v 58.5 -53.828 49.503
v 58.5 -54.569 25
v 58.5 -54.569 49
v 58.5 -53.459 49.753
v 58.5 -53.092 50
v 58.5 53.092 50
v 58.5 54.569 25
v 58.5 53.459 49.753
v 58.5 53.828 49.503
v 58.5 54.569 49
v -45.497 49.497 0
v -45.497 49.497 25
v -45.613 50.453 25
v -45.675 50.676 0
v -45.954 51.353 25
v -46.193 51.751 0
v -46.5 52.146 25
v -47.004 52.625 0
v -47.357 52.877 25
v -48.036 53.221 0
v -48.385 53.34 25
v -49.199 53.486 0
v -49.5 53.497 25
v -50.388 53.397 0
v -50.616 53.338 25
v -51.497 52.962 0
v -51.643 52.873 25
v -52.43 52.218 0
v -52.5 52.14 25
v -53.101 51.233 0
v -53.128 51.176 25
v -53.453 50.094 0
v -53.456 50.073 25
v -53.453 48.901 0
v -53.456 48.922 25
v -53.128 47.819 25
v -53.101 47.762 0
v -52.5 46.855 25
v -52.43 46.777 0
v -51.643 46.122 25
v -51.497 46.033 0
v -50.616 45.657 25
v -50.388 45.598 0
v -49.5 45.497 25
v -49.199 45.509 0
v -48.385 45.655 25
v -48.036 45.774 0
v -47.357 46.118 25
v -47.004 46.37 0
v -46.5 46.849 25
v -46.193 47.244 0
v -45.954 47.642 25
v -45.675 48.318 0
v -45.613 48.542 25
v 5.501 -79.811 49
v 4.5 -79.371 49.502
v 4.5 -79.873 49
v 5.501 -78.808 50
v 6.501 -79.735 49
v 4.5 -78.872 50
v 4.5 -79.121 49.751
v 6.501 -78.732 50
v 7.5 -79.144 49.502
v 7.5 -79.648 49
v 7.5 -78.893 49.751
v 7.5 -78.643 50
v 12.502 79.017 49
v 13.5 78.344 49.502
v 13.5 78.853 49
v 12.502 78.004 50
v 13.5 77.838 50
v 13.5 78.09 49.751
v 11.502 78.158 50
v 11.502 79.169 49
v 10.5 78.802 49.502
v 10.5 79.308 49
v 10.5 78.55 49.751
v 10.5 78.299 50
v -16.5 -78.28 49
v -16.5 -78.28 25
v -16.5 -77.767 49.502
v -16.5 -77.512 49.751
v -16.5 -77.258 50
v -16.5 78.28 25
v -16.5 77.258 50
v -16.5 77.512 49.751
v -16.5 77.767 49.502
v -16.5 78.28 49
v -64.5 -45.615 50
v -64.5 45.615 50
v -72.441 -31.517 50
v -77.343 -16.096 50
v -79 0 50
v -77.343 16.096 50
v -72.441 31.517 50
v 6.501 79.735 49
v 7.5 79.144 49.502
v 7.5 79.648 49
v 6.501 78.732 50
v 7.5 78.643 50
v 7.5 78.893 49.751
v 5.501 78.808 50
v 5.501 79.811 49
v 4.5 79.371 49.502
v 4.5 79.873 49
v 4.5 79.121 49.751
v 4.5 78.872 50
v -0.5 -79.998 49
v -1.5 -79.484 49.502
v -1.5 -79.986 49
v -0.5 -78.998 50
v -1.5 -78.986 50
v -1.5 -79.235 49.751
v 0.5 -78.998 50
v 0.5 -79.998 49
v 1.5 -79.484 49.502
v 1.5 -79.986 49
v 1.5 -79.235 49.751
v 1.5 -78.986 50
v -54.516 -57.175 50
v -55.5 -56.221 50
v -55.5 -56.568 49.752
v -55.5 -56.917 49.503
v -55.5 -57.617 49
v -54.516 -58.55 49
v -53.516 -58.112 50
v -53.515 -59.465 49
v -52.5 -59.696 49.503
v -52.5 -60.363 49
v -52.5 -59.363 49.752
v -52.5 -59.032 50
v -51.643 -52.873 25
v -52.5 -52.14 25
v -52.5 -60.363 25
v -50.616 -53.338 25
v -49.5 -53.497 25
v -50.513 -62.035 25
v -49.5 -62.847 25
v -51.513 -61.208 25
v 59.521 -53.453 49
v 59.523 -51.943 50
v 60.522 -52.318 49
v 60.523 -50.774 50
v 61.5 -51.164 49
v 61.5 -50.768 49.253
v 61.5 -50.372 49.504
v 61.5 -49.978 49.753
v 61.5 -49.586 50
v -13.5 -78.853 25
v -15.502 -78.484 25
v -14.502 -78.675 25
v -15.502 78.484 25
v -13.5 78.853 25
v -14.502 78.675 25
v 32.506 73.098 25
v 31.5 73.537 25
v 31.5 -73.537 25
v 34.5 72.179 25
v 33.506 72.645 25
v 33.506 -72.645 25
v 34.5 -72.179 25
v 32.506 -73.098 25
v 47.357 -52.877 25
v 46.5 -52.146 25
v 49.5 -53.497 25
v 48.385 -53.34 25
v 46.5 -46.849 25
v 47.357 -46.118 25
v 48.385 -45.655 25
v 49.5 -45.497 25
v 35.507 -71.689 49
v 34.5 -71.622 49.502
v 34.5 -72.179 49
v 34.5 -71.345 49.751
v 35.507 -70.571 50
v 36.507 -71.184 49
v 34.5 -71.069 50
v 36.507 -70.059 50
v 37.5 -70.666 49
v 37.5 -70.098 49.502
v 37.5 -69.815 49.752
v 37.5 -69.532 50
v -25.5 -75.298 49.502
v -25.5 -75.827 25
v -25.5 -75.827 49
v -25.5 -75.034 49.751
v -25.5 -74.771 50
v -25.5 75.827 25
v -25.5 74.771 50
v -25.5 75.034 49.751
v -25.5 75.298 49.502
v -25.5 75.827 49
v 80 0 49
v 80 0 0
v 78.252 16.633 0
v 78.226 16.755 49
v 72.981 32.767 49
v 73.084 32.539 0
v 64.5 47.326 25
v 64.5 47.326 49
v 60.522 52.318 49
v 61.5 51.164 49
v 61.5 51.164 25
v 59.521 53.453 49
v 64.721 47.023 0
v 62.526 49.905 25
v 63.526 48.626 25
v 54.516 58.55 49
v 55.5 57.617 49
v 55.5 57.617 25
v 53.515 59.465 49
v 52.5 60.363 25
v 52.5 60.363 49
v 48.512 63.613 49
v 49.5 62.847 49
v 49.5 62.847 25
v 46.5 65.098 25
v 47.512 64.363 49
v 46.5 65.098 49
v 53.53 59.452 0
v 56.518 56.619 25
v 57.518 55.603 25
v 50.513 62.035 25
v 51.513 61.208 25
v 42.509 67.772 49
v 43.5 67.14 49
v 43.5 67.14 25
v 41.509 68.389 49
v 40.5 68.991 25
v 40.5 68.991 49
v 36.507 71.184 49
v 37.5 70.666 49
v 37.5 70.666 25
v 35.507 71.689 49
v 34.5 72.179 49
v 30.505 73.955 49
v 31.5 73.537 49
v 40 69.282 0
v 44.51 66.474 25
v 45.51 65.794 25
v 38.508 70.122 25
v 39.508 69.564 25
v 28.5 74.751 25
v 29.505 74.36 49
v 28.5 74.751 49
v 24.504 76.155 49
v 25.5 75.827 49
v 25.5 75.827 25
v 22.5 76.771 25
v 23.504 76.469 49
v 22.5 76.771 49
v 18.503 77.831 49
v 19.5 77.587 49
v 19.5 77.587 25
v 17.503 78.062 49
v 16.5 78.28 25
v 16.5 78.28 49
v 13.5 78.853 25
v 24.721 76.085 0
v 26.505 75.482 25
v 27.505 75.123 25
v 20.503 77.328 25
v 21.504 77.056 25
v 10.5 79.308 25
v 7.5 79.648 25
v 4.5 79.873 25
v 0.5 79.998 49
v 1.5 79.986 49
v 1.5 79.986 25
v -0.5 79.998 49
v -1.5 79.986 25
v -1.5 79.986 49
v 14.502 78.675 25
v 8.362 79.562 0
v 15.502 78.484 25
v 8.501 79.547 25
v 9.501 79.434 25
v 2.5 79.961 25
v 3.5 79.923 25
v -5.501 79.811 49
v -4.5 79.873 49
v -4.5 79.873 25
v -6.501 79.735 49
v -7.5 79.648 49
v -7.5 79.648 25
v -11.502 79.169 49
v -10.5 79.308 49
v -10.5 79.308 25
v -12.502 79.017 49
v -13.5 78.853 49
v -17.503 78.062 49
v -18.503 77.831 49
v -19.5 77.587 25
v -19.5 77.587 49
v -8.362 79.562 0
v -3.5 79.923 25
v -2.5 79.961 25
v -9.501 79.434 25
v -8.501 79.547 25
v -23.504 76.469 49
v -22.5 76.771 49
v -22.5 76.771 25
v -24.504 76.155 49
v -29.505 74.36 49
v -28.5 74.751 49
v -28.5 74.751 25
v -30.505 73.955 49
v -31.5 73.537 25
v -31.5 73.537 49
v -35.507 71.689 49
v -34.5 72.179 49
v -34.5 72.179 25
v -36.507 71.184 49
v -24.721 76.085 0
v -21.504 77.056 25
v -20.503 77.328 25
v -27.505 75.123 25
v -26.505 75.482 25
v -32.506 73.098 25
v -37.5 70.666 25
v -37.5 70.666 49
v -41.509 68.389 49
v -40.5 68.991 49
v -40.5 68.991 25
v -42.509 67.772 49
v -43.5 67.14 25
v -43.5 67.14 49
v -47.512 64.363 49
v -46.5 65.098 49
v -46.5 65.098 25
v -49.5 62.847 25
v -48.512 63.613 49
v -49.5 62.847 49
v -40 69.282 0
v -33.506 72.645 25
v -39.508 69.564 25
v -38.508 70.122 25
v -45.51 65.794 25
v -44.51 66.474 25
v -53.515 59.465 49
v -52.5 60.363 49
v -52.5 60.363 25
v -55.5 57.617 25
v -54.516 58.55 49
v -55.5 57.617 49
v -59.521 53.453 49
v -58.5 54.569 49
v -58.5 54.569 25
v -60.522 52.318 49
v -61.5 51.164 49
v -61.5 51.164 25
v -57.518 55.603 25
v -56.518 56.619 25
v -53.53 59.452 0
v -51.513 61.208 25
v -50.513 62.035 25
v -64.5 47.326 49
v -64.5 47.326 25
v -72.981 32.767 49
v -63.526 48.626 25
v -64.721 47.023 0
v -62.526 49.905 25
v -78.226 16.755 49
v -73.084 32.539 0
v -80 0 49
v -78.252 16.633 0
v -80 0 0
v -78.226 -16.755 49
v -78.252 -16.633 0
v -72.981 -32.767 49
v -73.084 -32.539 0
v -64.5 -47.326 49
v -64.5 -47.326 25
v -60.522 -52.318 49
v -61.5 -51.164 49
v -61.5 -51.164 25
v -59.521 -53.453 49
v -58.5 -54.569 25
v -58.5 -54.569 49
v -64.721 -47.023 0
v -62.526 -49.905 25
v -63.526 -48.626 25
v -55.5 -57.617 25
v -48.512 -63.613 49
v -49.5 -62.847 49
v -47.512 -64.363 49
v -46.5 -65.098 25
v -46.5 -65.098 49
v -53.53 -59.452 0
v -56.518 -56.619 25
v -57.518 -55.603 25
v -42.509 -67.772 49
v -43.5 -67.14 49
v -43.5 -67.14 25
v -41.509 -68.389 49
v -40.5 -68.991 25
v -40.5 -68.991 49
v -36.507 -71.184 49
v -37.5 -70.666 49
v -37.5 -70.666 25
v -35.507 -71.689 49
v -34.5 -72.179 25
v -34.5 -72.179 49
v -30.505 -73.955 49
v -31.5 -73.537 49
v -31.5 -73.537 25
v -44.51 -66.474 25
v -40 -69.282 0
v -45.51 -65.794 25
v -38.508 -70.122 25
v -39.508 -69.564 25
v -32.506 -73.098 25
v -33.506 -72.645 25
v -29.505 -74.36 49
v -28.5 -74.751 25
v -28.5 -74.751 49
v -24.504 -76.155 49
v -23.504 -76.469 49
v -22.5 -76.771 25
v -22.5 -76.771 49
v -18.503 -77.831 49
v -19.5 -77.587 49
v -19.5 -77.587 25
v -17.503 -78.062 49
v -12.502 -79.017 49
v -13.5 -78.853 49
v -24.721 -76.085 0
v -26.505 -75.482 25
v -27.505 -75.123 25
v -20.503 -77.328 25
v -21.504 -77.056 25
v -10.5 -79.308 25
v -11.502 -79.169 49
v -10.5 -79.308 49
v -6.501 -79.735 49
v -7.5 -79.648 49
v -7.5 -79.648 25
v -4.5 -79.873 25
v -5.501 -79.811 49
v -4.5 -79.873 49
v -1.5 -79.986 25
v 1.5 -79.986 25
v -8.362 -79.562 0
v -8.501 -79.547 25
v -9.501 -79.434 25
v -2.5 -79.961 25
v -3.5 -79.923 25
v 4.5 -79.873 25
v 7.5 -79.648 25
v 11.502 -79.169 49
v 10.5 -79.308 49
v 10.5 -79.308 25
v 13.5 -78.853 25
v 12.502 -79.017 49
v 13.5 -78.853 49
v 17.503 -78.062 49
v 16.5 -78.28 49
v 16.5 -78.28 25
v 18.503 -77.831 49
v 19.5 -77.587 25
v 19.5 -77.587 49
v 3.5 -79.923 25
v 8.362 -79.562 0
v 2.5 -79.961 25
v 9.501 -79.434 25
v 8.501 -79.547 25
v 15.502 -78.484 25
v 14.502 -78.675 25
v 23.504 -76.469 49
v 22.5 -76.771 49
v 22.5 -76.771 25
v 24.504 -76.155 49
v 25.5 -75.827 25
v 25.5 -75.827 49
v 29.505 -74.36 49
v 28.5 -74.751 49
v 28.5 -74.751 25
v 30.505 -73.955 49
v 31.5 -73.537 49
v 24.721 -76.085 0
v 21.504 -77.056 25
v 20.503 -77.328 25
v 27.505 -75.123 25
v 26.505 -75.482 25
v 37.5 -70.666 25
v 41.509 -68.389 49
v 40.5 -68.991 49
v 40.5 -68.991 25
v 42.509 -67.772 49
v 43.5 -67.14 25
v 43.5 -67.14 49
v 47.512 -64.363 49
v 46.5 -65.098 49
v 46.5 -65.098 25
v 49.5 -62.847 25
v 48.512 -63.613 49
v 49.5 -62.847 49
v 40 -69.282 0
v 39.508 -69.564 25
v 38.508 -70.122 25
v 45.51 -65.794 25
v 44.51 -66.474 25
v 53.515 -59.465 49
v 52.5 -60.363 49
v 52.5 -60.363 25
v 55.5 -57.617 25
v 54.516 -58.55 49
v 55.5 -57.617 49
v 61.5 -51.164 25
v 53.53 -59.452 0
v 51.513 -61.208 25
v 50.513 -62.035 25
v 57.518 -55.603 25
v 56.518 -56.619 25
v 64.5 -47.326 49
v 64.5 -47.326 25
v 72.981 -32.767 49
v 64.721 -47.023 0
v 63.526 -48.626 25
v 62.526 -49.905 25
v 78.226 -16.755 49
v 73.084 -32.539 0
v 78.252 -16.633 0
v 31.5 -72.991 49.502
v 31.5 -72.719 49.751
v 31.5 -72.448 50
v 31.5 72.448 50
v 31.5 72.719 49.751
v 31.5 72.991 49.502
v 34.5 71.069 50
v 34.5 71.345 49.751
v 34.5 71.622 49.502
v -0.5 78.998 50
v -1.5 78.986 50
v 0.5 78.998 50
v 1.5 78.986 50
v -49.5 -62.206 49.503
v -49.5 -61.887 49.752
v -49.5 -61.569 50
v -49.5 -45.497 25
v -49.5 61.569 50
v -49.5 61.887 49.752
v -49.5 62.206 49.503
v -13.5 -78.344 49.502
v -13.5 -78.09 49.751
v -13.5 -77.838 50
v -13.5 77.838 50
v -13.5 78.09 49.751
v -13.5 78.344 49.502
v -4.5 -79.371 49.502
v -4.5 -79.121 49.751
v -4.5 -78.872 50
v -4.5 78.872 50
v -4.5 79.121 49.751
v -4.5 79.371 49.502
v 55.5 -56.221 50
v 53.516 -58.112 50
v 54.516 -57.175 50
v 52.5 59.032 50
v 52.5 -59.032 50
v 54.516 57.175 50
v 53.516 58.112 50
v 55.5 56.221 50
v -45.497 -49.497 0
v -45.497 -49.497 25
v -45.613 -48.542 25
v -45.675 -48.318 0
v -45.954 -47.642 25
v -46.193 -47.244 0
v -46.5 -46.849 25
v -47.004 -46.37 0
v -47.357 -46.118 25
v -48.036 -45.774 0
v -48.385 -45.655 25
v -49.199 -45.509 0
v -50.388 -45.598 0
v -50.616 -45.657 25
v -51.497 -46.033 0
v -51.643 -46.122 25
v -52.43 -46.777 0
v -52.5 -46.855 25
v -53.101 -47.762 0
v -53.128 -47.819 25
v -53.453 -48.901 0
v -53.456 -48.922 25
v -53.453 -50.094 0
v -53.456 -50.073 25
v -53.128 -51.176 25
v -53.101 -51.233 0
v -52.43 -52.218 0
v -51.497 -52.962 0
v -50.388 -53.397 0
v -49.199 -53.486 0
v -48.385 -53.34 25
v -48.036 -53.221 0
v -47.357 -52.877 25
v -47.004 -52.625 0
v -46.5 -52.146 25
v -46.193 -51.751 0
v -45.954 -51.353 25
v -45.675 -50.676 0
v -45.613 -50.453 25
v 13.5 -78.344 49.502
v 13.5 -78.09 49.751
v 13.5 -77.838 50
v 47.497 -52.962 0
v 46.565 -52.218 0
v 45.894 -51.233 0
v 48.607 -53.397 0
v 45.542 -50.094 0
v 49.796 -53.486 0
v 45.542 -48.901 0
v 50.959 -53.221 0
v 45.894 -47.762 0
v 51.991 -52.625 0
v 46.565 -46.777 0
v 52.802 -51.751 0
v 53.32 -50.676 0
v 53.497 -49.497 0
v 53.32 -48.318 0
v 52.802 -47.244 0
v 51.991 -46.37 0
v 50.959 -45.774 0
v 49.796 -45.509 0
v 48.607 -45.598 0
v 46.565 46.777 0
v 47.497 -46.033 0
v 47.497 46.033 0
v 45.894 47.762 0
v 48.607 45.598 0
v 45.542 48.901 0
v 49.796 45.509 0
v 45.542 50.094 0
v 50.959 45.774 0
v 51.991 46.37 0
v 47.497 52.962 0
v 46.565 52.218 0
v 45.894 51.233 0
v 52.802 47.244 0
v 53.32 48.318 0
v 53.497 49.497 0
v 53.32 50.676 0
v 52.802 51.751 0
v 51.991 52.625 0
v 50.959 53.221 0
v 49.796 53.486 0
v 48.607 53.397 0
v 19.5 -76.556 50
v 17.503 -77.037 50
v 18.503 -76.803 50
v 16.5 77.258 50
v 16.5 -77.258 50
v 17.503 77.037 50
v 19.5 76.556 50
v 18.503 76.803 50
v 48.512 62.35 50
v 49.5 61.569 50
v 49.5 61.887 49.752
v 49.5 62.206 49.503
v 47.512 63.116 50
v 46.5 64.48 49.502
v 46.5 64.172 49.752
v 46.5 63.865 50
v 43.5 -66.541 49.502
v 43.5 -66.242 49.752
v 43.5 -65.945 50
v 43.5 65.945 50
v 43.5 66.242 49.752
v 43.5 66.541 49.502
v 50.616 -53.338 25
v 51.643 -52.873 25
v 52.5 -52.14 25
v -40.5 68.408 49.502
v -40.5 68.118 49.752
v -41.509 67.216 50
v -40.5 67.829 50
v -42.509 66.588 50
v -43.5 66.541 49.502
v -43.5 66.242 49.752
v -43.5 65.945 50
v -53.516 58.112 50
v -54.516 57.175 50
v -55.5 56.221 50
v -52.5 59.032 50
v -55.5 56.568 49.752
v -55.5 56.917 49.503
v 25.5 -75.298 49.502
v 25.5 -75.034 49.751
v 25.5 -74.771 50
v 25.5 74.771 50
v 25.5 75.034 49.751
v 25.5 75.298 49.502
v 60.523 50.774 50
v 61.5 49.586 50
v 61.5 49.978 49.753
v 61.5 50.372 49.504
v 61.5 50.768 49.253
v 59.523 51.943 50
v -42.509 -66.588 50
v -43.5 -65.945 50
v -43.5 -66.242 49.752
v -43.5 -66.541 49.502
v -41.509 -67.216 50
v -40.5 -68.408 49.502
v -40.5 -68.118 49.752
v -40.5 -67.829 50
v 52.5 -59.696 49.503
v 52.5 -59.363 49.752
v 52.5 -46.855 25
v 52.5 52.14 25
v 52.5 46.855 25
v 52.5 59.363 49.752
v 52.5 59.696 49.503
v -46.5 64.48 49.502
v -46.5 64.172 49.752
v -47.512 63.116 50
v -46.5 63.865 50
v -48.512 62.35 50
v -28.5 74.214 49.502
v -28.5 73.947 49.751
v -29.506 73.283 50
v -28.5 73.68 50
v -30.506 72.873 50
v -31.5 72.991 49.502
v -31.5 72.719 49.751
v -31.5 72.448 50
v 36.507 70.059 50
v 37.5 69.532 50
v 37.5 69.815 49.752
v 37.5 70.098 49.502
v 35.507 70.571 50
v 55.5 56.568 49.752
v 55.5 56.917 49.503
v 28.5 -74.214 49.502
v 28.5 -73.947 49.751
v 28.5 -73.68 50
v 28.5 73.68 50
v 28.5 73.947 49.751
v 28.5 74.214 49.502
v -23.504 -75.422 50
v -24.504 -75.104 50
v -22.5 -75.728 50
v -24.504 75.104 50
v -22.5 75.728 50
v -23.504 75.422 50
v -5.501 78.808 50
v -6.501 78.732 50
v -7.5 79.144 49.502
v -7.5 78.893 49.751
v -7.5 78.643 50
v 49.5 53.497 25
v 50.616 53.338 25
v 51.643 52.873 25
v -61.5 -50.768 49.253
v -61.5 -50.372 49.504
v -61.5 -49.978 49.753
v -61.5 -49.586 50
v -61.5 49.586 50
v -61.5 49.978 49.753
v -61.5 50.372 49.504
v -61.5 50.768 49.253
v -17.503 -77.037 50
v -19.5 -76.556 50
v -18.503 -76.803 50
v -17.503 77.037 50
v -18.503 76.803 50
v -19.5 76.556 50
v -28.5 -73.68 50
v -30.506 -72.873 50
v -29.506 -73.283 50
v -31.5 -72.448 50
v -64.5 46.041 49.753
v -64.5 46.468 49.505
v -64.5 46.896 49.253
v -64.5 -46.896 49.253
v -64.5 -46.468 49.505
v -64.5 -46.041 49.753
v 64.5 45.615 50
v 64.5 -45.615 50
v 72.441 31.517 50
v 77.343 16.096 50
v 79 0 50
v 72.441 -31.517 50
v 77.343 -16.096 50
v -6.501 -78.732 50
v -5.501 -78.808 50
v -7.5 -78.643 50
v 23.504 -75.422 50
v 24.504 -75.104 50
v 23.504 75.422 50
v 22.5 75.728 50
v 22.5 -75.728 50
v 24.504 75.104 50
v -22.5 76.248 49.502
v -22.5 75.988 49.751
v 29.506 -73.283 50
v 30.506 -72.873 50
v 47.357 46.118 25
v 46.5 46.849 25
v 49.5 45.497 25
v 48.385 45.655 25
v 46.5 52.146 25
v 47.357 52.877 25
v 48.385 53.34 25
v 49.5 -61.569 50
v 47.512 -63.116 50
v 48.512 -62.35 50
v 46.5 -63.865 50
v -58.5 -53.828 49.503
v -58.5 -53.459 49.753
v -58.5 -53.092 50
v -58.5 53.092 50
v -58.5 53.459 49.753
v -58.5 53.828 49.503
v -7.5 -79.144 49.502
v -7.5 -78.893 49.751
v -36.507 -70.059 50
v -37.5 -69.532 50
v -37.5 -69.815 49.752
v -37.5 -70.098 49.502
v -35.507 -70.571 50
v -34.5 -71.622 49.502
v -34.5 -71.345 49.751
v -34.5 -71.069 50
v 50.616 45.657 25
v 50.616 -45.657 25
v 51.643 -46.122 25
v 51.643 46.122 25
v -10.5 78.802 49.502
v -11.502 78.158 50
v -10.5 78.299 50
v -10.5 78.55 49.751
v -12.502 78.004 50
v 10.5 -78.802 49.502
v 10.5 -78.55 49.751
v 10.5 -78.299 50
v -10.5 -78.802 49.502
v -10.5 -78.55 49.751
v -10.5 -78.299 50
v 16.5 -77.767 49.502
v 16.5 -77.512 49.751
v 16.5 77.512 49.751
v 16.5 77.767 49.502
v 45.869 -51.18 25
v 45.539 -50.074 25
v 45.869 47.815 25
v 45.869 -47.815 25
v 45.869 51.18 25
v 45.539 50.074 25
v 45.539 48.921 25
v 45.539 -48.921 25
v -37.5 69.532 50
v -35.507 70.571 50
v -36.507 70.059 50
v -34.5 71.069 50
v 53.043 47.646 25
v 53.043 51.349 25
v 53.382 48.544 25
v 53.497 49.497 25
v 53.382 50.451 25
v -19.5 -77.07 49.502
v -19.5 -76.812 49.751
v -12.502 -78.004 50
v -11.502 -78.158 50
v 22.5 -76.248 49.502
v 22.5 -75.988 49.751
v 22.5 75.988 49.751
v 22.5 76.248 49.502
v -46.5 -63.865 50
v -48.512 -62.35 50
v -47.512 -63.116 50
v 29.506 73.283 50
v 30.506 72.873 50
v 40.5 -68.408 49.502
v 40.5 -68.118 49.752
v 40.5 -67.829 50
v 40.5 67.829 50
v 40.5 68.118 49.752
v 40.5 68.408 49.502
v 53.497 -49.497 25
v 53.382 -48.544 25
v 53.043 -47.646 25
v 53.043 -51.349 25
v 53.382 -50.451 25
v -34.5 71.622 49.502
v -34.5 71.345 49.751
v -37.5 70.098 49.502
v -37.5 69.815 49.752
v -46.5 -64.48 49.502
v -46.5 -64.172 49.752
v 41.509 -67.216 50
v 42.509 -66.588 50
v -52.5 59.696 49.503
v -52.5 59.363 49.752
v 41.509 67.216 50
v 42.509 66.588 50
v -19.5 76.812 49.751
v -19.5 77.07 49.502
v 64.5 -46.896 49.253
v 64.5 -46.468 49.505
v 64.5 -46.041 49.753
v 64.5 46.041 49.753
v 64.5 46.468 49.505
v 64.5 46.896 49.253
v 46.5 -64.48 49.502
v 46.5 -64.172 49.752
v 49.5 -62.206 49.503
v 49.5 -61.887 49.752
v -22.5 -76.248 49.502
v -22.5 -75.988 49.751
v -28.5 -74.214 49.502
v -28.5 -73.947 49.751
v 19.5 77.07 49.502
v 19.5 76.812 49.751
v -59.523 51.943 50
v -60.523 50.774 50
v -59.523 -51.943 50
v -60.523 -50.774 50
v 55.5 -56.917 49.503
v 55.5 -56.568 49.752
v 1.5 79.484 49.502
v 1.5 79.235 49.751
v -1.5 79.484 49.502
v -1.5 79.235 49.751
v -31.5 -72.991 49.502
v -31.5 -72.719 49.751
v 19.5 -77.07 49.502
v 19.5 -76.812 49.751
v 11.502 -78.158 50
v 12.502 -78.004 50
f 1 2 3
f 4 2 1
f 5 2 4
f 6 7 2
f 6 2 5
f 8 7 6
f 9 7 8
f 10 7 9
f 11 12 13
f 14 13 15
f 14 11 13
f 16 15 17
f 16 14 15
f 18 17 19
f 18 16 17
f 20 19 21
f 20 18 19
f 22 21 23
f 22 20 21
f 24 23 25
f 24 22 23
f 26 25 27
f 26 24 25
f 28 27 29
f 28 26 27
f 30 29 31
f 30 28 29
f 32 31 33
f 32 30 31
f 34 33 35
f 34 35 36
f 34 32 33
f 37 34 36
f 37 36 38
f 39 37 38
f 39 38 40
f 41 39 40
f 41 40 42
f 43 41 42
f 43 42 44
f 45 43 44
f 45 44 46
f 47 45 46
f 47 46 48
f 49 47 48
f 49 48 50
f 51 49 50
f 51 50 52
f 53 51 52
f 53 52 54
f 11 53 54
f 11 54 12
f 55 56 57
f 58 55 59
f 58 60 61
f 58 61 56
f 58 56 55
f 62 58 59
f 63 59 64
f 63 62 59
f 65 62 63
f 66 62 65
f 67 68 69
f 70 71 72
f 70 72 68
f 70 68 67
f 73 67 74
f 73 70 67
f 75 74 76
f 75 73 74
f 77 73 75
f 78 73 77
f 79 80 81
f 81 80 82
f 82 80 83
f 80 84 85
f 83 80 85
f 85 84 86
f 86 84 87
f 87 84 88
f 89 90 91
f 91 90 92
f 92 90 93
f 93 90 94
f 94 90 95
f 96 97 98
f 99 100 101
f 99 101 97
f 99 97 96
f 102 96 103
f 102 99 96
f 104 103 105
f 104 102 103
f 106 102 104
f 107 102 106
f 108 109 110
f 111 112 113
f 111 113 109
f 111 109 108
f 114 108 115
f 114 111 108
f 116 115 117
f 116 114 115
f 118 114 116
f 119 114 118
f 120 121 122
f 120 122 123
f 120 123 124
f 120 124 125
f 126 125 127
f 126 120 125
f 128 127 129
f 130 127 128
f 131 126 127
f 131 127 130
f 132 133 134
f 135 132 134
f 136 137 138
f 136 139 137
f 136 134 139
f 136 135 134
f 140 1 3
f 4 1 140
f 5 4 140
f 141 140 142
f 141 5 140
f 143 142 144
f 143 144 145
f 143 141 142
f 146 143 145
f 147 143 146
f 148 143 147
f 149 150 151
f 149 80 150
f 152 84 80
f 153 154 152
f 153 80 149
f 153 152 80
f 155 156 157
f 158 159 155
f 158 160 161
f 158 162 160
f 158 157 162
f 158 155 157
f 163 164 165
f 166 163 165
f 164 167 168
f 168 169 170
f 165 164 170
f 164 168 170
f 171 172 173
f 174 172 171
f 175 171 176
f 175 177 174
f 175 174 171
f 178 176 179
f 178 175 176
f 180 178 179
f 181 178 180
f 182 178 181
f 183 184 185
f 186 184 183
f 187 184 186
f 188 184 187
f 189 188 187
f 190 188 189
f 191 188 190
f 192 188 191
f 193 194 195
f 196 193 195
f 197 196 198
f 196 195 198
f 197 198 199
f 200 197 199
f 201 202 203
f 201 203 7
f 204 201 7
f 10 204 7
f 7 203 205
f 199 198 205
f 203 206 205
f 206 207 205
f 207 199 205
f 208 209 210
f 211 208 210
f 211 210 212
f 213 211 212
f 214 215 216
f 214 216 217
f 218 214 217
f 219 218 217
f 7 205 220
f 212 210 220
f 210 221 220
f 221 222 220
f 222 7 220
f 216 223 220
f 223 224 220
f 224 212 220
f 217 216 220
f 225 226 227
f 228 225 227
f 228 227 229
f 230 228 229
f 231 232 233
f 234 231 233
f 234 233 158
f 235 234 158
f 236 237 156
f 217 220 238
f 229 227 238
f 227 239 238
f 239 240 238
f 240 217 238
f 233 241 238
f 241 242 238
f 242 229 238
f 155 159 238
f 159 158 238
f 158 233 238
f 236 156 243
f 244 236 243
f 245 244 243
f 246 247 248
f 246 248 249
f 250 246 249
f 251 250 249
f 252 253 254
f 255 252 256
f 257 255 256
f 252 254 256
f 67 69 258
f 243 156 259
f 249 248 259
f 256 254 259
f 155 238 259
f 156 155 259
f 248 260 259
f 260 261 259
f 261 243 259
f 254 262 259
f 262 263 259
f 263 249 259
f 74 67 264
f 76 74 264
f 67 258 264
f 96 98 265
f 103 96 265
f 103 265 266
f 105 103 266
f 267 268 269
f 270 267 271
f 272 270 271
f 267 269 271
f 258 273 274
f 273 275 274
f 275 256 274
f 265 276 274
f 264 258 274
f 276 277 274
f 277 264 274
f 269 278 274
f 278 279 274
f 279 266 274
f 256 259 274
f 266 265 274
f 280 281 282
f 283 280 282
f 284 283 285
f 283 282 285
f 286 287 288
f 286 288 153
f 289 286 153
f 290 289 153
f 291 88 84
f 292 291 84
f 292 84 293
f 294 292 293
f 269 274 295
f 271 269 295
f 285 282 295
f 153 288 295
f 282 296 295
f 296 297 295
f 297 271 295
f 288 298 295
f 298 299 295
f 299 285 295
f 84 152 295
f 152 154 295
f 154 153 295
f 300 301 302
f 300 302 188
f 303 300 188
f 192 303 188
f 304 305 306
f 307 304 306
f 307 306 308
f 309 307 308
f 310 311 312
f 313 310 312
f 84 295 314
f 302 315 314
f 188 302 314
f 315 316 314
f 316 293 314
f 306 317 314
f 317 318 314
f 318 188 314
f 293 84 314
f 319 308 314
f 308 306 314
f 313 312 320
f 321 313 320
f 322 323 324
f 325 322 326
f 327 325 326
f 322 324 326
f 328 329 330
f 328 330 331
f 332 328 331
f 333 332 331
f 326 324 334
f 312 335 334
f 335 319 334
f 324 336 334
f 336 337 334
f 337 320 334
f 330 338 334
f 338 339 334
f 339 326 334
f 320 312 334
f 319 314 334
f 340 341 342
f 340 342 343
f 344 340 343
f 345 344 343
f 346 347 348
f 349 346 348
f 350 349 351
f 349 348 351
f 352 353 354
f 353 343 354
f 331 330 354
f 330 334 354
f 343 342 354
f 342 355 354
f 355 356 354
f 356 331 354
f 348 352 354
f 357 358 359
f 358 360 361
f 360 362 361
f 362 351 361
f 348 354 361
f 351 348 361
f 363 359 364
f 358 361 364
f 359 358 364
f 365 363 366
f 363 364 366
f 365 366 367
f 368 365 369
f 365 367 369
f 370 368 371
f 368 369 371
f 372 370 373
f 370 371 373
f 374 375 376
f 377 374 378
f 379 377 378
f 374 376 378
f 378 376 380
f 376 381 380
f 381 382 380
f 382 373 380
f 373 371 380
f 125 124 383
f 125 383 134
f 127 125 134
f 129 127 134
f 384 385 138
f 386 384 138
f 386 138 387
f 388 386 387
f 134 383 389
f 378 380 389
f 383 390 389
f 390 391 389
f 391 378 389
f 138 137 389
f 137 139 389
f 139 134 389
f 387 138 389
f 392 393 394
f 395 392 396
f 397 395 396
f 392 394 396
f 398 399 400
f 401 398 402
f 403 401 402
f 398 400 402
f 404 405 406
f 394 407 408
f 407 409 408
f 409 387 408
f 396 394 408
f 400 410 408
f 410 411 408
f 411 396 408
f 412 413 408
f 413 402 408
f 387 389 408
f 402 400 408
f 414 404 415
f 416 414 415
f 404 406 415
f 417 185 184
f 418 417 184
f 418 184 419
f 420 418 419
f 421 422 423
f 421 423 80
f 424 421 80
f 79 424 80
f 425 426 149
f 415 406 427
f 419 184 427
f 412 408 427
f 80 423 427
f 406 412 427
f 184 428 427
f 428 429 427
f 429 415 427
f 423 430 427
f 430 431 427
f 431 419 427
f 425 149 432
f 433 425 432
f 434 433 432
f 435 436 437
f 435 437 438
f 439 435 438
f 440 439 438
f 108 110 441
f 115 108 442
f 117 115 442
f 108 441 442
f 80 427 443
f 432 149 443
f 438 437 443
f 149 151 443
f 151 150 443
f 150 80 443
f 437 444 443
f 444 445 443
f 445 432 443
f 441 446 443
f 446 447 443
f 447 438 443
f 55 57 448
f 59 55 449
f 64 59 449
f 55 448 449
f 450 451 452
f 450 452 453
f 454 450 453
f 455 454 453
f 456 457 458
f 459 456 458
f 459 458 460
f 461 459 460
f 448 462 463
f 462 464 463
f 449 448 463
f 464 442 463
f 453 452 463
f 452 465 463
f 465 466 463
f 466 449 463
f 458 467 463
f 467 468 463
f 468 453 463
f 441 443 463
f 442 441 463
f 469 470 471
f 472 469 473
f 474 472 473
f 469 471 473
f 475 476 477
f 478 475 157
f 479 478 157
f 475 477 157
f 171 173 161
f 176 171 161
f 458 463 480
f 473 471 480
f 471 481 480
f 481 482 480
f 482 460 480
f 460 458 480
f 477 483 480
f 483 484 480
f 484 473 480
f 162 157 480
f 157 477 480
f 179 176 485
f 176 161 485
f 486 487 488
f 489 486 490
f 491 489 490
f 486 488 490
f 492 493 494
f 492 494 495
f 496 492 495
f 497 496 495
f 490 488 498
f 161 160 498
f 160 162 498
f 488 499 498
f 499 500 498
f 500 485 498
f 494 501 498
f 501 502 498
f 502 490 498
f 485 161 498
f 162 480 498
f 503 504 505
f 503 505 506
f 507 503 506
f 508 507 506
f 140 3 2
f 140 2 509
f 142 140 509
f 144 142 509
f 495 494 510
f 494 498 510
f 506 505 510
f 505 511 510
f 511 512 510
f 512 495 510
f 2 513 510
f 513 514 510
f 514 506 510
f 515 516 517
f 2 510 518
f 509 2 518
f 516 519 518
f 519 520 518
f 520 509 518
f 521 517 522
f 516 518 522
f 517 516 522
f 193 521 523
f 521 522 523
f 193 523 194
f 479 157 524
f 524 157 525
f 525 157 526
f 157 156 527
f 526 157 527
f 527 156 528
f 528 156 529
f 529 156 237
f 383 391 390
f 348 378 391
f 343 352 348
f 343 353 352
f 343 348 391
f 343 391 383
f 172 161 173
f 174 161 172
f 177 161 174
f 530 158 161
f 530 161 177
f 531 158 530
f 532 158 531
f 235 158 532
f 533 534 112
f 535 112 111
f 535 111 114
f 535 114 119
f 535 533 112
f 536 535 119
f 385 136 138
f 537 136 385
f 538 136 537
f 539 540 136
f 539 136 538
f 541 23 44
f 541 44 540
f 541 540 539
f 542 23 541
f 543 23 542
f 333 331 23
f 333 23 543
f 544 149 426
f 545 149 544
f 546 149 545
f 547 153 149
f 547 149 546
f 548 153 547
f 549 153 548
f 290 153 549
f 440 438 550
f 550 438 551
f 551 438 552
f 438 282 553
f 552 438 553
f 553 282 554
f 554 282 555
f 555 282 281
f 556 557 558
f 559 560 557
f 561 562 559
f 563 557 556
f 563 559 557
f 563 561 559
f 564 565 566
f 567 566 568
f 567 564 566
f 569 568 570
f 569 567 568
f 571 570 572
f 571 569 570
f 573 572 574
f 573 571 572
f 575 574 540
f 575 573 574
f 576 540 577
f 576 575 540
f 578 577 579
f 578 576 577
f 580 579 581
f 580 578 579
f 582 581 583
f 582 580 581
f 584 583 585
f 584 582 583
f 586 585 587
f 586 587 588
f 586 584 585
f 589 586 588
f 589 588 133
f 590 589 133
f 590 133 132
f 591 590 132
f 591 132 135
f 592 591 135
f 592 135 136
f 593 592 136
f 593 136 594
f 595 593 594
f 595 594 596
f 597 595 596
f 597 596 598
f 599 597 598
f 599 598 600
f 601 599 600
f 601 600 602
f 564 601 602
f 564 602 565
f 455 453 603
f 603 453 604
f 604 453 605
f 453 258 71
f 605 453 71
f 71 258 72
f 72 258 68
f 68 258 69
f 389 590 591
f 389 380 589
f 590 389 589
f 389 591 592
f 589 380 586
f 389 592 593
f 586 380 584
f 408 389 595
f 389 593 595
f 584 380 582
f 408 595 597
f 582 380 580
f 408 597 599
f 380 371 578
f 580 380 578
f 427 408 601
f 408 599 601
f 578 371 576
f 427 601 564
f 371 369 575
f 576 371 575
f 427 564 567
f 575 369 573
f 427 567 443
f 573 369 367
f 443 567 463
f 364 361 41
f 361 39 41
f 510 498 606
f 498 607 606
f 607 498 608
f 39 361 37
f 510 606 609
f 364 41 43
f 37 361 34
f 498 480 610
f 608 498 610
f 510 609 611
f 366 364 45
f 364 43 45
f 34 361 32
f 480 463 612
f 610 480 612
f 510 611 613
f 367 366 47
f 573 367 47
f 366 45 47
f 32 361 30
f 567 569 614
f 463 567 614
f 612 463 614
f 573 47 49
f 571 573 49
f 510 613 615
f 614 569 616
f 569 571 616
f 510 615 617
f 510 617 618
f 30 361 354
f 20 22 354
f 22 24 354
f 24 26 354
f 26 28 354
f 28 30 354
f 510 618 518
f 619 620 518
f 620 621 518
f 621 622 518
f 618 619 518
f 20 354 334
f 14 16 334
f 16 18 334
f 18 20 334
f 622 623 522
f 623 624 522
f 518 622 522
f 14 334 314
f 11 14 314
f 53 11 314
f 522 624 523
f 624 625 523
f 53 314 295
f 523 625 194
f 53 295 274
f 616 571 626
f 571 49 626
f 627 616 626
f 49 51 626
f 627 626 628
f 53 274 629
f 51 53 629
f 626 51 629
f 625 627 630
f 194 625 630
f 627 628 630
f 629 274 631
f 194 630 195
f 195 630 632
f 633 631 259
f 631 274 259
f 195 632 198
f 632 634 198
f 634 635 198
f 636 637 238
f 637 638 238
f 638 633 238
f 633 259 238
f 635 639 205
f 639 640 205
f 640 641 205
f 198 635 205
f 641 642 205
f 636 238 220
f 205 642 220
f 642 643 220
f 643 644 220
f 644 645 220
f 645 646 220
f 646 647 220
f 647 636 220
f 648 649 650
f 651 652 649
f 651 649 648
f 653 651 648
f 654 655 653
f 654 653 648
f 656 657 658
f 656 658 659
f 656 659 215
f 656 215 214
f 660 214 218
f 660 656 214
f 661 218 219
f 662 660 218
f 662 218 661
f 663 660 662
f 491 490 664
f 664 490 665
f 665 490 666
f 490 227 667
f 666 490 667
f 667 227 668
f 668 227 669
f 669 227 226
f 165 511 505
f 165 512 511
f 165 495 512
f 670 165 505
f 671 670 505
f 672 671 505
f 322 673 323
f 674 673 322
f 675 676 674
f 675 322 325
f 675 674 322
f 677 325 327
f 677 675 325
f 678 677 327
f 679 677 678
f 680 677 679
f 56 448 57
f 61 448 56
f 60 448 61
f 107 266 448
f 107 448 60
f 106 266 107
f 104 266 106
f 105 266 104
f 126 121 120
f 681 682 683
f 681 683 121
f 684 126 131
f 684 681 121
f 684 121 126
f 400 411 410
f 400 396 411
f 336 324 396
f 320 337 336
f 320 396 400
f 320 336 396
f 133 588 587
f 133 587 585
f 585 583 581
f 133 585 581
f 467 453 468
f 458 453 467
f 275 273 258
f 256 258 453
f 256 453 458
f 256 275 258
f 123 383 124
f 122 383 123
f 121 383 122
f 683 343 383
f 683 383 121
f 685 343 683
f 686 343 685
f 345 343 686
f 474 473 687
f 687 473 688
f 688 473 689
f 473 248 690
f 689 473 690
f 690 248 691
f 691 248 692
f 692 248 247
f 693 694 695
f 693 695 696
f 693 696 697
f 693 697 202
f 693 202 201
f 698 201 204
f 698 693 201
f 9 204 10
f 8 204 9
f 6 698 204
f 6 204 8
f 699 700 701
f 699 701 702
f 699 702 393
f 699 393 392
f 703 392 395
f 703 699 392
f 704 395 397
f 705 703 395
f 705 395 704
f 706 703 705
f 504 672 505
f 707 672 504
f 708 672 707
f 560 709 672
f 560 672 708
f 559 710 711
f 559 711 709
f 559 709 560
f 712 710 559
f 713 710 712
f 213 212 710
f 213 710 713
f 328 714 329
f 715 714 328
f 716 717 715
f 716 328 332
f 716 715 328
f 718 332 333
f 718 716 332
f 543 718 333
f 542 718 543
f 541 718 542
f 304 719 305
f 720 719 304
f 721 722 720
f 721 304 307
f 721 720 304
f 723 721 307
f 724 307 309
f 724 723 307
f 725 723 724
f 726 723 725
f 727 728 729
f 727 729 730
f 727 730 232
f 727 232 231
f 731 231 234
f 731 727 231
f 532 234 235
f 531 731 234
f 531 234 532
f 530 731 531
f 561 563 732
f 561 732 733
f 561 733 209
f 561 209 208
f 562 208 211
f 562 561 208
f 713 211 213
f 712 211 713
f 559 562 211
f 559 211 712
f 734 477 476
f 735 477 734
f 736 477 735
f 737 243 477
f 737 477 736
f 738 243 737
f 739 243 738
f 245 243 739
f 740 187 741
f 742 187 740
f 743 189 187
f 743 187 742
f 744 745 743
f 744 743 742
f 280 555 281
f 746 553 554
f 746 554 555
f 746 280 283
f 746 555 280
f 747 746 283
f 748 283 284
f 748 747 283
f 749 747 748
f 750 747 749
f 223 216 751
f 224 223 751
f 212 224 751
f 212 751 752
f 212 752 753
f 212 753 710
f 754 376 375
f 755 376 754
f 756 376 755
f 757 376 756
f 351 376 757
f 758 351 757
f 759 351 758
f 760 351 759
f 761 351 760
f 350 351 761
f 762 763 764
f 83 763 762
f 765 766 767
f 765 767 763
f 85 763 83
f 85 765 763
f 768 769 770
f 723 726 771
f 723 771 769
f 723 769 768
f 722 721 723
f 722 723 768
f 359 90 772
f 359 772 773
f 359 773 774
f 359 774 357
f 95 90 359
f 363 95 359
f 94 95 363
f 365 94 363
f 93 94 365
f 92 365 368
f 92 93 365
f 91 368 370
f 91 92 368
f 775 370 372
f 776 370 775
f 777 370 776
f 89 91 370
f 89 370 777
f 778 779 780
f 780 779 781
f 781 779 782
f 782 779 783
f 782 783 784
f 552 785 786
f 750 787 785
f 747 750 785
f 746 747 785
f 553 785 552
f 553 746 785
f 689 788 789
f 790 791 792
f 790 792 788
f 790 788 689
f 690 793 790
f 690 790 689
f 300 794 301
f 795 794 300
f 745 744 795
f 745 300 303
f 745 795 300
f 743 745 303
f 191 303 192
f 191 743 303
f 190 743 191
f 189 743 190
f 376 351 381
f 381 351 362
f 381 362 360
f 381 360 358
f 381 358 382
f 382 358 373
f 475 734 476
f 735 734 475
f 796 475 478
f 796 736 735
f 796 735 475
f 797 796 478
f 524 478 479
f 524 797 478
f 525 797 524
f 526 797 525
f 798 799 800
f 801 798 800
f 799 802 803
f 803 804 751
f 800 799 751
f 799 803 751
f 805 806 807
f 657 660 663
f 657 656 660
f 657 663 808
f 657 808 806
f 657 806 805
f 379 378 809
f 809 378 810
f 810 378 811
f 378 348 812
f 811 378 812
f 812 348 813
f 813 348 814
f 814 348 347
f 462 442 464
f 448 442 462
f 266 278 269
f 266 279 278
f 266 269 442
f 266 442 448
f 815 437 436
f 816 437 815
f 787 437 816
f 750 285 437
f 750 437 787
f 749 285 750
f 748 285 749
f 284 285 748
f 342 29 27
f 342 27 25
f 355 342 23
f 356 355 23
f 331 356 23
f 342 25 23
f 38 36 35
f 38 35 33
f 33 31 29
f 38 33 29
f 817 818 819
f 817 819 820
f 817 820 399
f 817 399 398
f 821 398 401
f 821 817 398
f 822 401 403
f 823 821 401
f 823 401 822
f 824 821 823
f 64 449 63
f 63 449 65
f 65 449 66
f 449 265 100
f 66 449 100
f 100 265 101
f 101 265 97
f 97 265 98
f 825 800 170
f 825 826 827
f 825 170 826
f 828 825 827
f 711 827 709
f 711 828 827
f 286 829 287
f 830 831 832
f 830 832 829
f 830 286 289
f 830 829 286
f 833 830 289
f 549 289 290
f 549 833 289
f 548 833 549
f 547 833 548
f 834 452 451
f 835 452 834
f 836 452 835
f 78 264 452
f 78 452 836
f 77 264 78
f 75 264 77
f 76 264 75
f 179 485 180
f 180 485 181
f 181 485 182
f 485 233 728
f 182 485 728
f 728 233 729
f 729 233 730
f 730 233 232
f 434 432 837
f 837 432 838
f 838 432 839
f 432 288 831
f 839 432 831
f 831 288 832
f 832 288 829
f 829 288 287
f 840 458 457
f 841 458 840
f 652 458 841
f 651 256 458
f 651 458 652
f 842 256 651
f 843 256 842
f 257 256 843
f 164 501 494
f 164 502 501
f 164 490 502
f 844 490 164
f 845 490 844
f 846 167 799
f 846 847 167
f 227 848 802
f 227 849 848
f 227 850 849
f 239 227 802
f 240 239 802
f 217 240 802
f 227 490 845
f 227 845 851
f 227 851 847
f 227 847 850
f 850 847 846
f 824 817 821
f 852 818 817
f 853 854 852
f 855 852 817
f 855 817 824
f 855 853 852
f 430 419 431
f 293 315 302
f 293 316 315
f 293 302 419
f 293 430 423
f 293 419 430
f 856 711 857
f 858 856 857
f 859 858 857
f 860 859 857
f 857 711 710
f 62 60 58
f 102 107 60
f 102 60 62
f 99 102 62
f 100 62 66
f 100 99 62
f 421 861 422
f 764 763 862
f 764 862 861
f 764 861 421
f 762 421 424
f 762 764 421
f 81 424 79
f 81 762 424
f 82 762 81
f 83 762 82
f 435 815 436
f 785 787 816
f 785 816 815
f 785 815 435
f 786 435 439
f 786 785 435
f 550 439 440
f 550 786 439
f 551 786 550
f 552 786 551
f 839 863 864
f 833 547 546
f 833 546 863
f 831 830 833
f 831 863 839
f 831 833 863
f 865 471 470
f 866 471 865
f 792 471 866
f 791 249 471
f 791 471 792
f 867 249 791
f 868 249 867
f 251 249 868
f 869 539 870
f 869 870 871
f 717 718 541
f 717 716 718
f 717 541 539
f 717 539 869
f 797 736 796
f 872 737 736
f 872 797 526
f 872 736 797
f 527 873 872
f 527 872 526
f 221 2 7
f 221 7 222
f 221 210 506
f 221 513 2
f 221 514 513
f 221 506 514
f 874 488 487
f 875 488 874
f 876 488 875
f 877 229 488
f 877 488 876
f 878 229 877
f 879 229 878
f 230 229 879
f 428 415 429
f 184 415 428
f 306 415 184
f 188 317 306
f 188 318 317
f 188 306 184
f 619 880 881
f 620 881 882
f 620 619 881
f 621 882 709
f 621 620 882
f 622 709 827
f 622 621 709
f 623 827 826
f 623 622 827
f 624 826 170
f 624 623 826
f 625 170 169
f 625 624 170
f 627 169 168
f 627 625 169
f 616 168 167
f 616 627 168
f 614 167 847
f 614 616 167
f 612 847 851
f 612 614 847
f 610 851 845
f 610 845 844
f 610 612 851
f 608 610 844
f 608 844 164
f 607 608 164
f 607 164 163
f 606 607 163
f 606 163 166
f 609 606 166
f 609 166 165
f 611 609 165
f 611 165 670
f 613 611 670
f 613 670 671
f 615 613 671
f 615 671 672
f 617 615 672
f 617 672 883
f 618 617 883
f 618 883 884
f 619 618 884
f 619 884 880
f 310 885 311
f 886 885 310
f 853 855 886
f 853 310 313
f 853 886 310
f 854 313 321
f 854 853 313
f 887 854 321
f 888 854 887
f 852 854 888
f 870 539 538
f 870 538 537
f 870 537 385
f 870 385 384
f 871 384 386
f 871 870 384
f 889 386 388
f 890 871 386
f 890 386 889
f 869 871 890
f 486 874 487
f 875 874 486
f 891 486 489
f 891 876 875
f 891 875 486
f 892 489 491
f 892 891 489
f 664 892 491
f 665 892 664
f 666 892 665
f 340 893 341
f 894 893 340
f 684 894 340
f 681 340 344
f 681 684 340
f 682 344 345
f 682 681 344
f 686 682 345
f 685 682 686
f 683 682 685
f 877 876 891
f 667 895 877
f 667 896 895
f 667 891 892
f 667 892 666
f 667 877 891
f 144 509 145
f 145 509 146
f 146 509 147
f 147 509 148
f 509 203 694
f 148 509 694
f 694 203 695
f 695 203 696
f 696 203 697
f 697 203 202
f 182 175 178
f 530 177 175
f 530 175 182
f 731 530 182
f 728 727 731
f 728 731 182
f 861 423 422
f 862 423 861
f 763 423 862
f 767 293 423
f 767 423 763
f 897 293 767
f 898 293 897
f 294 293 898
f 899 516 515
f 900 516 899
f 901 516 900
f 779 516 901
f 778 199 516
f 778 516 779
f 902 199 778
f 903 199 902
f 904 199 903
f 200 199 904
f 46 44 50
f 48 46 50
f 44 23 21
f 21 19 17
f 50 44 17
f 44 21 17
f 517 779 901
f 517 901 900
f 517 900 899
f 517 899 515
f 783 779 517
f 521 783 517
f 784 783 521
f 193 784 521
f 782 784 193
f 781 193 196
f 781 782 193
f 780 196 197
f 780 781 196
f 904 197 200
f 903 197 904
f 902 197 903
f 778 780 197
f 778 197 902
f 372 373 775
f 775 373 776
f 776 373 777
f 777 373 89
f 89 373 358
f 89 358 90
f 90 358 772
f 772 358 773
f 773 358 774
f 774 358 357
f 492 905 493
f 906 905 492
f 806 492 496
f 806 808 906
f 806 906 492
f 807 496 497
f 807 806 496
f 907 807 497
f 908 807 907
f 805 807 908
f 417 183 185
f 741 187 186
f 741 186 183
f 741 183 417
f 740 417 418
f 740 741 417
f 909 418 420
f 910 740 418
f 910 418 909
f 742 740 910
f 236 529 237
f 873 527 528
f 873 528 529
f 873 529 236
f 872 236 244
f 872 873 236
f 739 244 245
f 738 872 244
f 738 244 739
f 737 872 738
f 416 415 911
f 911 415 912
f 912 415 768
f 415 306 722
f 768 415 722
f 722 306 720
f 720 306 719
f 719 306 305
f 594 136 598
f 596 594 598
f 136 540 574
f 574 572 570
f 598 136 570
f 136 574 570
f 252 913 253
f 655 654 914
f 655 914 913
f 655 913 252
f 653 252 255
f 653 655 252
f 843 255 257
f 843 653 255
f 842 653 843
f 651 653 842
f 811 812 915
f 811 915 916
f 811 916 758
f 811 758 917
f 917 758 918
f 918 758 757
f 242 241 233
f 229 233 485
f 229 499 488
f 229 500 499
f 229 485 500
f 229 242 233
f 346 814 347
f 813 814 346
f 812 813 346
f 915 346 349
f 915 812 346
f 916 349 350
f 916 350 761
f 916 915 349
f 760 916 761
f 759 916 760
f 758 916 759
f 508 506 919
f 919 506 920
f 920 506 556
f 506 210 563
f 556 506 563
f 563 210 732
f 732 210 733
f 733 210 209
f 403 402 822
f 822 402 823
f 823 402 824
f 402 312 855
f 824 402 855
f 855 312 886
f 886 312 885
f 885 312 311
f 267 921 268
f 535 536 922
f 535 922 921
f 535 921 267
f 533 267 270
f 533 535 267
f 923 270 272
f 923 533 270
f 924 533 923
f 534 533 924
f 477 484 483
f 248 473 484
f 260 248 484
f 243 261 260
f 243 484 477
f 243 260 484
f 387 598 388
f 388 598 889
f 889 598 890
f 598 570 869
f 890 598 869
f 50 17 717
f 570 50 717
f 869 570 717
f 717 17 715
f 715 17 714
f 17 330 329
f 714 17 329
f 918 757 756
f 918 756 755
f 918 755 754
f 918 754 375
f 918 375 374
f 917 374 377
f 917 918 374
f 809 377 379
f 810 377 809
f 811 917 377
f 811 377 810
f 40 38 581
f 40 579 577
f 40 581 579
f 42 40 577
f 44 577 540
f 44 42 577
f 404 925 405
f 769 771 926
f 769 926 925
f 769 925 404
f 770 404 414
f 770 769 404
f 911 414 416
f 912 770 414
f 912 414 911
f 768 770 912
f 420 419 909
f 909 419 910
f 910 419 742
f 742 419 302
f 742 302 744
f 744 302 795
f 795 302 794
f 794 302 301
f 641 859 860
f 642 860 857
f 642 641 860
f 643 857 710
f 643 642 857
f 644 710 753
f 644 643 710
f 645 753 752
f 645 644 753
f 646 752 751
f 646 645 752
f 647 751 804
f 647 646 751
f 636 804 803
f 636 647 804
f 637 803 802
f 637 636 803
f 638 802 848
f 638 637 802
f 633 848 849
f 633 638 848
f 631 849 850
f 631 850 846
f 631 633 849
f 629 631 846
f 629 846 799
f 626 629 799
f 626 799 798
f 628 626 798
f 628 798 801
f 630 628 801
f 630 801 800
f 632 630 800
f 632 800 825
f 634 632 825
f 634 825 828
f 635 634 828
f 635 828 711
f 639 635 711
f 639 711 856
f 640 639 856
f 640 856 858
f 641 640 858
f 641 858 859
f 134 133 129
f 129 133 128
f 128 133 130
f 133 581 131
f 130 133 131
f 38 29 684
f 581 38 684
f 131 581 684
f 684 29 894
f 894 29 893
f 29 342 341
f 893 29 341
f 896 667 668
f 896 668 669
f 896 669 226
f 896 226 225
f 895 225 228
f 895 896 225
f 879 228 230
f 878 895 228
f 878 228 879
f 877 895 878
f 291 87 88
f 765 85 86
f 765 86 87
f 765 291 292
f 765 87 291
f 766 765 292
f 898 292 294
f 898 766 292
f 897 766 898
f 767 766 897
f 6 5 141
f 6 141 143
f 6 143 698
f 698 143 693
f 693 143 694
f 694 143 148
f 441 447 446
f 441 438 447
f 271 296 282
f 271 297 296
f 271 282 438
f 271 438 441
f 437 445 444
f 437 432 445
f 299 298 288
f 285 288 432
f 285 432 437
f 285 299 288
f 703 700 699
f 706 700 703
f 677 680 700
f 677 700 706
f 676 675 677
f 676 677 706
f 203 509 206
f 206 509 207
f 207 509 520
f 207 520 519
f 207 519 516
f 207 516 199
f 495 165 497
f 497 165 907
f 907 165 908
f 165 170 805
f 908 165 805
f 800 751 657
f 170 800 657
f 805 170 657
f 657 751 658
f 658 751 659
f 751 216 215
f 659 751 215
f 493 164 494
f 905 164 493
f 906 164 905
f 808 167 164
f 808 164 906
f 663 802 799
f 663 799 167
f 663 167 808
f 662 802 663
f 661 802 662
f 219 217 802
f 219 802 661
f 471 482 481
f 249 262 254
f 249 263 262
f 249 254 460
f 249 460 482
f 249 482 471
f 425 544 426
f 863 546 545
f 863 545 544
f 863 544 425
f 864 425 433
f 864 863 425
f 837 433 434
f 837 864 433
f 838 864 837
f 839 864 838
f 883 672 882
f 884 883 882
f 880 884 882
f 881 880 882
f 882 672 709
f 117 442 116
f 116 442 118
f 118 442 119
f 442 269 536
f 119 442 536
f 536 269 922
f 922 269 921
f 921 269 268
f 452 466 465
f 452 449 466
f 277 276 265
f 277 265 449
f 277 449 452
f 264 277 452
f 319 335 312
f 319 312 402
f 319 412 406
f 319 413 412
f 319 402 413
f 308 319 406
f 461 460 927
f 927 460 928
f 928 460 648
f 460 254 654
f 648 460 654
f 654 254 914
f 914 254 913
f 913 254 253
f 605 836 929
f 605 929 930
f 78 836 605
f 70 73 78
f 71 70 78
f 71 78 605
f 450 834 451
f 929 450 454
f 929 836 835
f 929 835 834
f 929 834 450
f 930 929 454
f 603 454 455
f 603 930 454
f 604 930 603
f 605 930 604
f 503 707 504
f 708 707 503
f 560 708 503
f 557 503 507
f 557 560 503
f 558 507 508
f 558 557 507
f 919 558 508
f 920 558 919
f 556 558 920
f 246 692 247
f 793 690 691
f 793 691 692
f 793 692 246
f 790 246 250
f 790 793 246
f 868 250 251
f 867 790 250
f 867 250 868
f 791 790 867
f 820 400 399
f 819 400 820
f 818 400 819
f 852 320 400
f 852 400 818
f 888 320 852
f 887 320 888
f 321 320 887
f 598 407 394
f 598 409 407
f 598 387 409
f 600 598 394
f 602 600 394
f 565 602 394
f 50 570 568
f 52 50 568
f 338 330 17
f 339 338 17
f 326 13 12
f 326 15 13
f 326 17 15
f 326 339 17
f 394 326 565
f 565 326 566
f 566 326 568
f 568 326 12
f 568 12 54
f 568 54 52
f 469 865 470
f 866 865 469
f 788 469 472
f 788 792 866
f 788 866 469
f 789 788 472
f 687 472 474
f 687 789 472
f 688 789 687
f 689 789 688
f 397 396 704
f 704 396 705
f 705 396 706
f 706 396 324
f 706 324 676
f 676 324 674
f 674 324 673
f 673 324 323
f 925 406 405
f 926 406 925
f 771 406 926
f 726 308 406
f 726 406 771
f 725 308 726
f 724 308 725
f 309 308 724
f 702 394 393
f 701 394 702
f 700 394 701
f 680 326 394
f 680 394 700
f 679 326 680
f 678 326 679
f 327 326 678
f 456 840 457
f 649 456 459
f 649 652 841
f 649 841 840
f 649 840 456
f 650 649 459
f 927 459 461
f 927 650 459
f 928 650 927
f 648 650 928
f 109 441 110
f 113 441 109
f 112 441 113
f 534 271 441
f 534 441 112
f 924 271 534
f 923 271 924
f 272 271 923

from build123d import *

# Parameters (mm, degrees)
F0_R          = 80
F1_DEPTH      = 50
F2_R          = 4
F3_DEPTH      = 25
F4_SIZE       = 1
F5_W          = 3
F5_H          = 35
F6_DEPTH      = 100
F6_DEPTH_BACK = 100


with BuildPart() as f1:
    # F0 (on Top) → F1 (new body)
    with BuildSketch(Plane.XY):
        Circle(F0_R)
    extrude(amount=F1_DEPTH)

    # F2 (on Top) → F3 (cut)
    with BuildSketch(Plane.XY):
        with Locations((-49.497475, 49.497475)):
            Circle(F2_R)
        with Locations((-49.497475, -49.497475)):
            Circle(F2_R)
        with Locations((49.497475, 49.497475)):
            Circle(F2_R)
        with Locations((49.497475, -49.497475)):
            Circle(F2_R)
    extrude(amount=F3_DEPTH, mode=Mode.SUBTRACT)

    # F4
    f4_edges = [f1.edges().sort_by_distance(p)[0] for p in [
        (-80, 0, 50),
    ]]
    chamfer(f4_edges, length=F4_SIZE)

    # F5 (on Front) → F6 (cut, two sides)
    with BuildSketch(Plane.XZ) as f6_sk:
        with Locations((-63, 42.5)):
            Rectangle(F5_W, F5_H)
        with Locations((-57, 42.5)):
            Rectangle(F5_W, F5_H)
        with Locations((-51, 42.5)):
            Rectangle(F5_W, F5_H)
        with Locations((-45, 42.5)):
            Rectangle(F5_W, F5_H)
        with Locations((-39, 42.5)):
            Rectangle(F5_W, F5_H)
        with Locations((-33, 42.5)):
            Rectangle(F5_W, F5_H)
        with Locations((-27, 42.5)):
            Rectangle(F5_W, F5_H)
        with Locations((-21, 42.5)):
            Rectangle(F5_W, F5_H)
        with Locations((-15, 42.5)):
            Rectangle(F5_W, F5_H)
        with Locations((-9, 42.5)):
            Rectangle(F5_W, F5_H)
        with Locations((-3, 42.5)):
            Rectangle(F5_W, F5_H)
        with Locations((3, 42.5)):
            Rectangle(F5_W, F5_H)
        with Locations((9, 42.5)):
            Rectangle(F5_W, F5_H)
        with Locations((15, 42.5)):
            Rectangle(F5_W, F5_H)
        with Locations((21, 42.5)):
            Rectangle(F5_W, F5_H)
        with Locations((27, 42.5)):
            Rectangle(F5_W, F5_H)
        with Locations((33, 42.5)):
            Rectangle(F5_W, F5_H)
        with Locations((39, 42.5)):
            Rectangle(F5_W, F5_H)
        with Locations((45, 42.5)):
            Rectangle(F5_W, F5_H)
        with Locations((51, 42.5)):
            Rectangle(F5_W, F5_H)
        with Locations((57, 42.5)):
            Rectangle(F5_W, F5_H)
        with Locations((63, 42.5)):
            Rectangle(F5_W, F5_H)
    extrude(amount=F6_DEPTH, mode=Mode.SUBTRACT)
    extrude(f6_sk.sketch, amount=-F6_DEPTH_BACK, mode=Mode.SUBTRACT)


solid = f1.part
